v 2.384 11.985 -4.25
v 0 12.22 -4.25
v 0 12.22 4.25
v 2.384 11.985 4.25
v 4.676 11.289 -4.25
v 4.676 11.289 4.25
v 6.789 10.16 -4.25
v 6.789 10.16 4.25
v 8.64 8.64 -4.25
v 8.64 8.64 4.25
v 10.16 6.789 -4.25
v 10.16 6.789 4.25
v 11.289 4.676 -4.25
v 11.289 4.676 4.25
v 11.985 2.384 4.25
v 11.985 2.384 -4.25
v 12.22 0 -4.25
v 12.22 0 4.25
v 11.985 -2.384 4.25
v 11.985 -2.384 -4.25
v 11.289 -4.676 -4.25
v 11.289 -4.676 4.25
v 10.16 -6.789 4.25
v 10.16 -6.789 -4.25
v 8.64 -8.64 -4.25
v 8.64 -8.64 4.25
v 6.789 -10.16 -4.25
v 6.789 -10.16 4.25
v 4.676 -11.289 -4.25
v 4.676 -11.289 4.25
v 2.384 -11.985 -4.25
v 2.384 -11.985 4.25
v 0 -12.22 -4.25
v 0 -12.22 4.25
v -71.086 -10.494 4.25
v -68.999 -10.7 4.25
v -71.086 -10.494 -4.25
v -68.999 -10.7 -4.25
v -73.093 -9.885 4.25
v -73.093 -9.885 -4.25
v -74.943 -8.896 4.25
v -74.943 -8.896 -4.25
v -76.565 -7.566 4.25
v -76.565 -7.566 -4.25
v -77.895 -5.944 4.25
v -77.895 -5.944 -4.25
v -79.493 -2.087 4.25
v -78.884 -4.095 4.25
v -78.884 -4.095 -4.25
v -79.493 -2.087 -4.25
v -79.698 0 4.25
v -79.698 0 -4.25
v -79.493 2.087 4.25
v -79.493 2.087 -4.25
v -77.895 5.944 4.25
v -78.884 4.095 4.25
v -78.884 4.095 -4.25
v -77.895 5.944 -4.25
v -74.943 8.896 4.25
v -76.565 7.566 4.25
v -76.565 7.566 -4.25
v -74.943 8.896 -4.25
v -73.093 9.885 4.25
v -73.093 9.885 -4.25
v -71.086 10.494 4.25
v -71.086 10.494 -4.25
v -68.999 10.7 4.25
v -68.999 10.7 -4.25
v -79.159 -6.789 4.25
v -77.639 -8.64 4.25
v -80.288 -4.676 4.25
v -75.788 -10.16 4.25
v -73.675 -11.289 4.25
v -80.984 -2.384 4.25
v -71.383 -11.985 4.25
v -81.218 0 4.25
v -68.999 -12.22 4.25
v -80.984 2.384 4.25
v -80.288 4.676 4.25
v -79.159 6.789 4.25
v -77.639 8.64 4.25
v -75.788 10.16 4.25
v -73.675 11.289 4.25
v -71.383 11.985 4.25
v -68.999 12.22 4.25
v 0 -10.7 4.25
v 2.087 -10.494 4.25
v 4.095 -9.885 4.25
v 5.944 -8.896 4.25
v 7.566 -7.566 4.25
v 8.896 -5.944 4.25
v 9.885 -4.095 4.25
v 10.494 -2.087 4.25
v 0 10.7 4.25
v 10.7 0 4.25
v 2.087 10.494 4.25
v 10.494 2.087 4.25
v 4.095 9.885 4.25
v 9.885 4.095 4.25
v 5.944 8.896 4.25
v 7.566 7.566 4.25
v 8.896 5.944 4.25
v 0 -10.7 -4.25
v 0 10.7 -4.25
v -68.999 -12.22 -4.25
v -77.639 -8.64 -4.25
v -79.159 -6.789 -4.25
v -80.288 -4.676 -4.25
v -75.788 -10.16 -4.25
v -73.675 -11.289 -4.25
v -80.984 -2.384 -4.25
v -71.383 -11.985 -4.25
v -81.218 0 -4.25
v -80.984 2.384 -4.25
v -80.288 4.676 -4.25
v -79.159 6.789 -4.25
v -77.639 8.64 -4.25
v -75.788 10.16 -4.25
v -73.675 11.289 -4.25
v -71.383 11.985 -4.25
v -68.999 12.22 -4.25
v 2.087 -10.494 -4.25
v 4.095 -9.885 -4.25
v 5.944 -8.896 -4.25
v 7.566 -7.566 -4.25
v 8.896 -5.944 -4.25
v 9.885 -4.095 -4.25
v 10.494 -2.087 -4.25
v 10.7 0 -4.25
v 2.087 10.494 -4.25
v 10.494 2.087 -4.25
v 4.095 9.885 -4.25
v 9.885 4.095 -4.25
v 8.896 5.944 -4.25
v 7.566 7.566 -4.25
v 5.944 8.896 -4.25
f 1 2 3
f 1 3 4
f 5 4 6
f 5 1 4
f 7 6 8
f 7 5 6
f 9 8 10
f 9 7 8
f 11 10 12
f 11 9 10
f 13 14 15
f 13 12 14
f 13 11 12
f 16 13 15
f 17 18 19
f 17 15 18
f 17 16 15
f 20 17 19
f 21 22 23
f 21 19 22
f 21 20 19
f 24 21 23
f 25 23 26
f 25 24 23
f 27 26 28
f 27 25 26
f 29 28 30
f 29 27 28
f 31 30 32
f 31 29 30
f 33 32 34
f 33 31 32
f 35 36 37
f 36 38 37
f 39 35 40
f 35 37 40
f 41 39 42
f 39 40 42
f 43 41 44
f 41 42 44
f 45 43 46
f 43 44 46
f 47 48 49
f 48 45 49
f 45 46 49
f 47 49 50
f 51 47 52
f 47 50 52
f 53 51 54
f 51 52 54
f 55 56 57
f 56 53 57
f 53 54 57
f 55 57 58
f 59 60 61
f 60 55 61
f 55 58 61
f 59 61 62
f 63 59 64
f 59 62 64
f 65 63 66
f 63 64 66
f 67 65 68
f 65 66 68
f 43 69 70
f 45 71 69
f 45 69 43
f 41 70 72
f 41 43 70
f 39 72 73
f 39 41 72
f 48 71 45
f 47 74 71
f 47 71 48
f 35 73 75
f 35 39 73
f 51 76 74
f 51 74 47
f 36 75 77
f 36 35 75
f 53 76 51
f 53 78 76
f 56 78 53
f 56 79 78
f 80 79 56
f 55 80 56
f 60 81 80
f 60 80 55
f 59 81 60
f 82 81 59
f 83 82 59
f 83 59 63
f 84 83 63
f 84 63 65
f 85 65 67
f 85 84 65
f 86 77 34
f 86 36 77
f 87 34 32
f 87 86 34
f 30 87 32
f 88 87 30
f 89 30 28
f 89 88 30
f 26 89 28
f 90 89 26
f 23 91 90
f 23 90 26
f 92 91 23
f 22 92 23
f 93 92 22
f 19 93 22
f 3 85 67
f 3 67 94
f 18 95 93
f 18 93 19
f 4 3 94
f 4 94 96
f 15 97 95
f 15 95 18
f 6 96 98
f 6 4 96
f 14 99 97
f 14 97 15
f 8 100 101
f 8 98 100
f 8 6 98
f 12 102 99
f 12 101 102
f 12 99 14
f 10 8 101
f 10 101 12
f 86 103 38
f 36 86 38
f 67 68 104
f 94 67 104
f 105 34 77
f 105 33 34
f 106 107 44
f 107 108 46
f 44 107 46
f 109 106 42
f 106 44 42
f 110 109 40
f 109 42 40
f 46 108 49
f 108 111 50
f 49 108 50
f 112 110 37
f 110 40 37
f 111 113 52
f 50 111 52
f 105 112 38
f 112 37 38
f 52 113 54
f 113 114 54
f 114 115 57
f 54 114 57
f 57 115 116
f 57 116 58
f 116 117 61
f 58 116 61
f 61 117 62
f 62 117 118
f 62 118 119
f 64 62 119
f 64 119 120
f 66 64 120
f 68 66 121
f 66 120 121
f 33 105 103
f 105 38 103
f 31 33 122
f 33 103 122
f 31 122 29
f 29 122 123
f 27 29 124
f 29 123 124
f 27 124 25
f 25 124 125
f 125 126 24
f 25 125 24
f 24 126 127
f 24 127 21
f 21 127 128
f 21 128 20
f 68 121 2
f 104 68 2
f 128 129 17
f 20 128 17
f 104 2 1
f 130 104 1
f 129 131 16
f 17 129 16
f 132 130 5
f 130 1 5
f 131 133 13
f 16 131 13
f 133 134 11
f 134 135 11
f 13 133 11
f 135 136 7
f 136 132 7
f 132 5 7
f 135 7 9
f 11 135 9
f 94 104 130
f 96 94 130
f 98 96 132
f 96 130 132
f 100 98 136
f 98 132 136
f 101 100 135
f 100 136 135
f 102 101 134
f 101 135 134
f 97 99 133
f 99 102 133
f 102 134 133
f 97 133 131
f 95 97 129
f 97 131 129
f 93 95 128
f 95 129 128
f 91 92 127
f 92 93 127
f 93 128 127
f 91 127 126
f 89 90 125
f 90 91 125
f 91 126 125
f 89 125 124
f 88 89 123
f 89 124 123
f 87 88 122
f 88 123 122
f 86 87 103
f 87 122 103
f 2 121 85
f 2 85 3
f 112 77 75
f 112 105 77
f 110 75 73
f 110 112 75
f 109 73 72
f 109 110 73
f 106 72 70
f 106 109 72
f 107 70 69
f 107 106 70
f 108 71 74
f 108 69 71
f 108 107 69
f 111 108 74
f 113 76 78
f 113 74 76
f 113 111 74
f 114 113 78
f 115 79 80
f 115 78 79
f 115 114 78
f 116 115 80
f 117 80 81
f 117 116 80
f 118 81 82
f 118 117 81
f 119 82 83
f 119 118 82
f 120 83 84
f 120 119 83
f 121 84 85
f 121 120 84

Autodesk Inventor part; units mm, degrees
ref_plane "YZ Plane" through (0, 0, 0) normal (1, 0, 0) x (0, 1, 0)
ref_plane "XZ Plane" through (0, 0, 0) normal (0, 1, 0) x (-1, 0, 0)
ref_plane "XY Plane" through (0, 0, 0) normal (0, 0, 1) x (1, 0, 0)
sketch "Sketch1" plane through (0, 0, 0) normal (0, 0, 1) x (1, 0, 0)
  arc A0 (0, -11.4595) -> (0, 11.4595) centre (0, 0) ccw construction
  arc A1 (-68.9989, 11.4595) -> (-68.9989, -11.4595) centre (-68.9989, 0) ccw construction
  line L0 (0, -11.4595) -> (-68.9989, -11.4595) construction
  line L1 (0, 11.4595) -> (-68.9989, 11.4595) construction
  dimension "Belt_Teeth" = 70
  dimension "Belt_Pitch2" = 3
  dimension "d0" = 22.919
  dimension "d1" = 22.919
  dimension "d2" = 36.0011
  dimension "d3" = 36.0011
  dimension "Center_Distance" = 68.9989
  dimension "d5" = 68.9989
sketch "Sketch2" plane through (0, 0, 0) normal (0, 0, 1) x (1, 0, 0)
  line L0 (35.7235, 34.2567) -> (38.7235, 34.2567)
  point P0 (0, 0)
  dimension "Belt_Pitch2" = 3
sketch "Sketch4" plane through (0, 0, 0) normal (0, 0, 1) x (1, 0, 0)
  line L0 (-16.1422, -21.869) -> (-14.1422, -21.869)
  line L1 (-16.1422, -21.869) -> (-16.1422, -20.349)
  arc A0 (-15.5872, -20.904) -> (-16.1422, -20.349) centre (-16.1422, -20.904) ccw
  line L2 (-15.5872, -20.904) -> (-15.5872, -20.959)
  arc A1 (-15.5872, -20.959) -> (-15.4372, -21.109) centre (-15.4372, -20.959) ccw
  line L3 (-15.4372, -21.109) -> (-14.8472, -21.109)
  line L4 (-14.1422, -21.869) -> (-14.1422, -20.349)
  arc A2 (-14.1422, -20.349) -> (-14.6972, -20.904) centre (-14.1422, -20.904) ccw
  arc A3 (-14.8472, -21.109) -> (-14.6972, -20.959) centre (-14.8472, -20.959) ccw
  line L5 (-14.6972, -20.959) -> (-14.6972, -20.904)
  line L6 (0, 11.4595) -> (-68.9989, 11.4595) construction
  arc A4 (-68.9989, 11.4595) -> (-68.9989, -11.4595) centre (-68.9989, 0) ccw construction
  line L7 (0, -11.4595) -> (-68.9989, -11.4595) construction
  arc A5 (0, -11.4595) -> (0, 11.4595) centre (0, 0) ccw construction
  arc A6 (-68.9989, 12.2195) -> (-68.9989, -12.2195) centre (-68.9989, 0) ccw
  line L8 (-68.9989, 12.2195) -> (0, 12.2195)
  arc A7 (0, -12.2195) -> (0, 12.2195) centre (0, 0) ccw
  line L9 (0, -12.2195) -> (-68.9989, -12.2195)
  arc A8 (-68.9989, 10.6995) -> (-68.9989, -10.6995) centre (-68.9989, 0) ccw
  line L10 (-68.9989, 10.6995) -> (0, 10.6995)
  arc A9 (0, -10.6995) -> (0, 10.6995) centre (0, 0) ccw
  line L11 (0, -10.6995) -> (-68.9989, -10.6995)
  point P0 (-15.1422, -21.109)
  point P1 (-15.1422, -21.869)
  dimension "d9" = 2
  dimension "d10" = 1.52
  dimension "d11" = 0.76
  dimension "d12" = 0.555
  dimension "d13" = 0.555
  dimension "d14" = 0.15
  dimension "d15" = 0.15
  dimension "belt_thickness" = 1.52
  dimension "d44" = 0.76
extrude "Extrusion2" add sketch "Sketch4" along normal mid plane 8.5 contours L8 A7 L9 A6
sketch "Sketch5" plane through (0, 0, 4.25) normal (0, 0, 1) x (1, 0, 0)
  line L0 (-68.9989, 10.6995) -> (0, 10.6995) construction
  arc A0 (0, -10.6995) -> (0, 10.6995) centre (0, 0) ccw construction
  line L1 (0, -10.6995) -> (-68.9989, -10.6995) construction
  arc A1 (-68.9989, 10.6995) -> (-68.9989, -10.6995) centre (-68.9989, 0) ccw construction
  arc A2 (-68.9989, 12.2195) -> (-68.9989, -12.2195) centre (-68.9989, 0) ccw construction
  line L2 (-68.9989, -12.2195) -> (0, -12.2195) construction
  arc A3 (0, -12.2195) -> (0, 12.2195) centre (0, 0) ccw construction
  line L3 (0, 12.2195) -> (-68.9989, 12.2195) construction
  line L4 (-7.7556, -2.6989) -> (-5.7556, -2.6989)
  line L5 (-7.7556, -2.6989) -> (-7.7556, -1.1789) construction
  arc A4 (-7.2006, -1.7339) -> (-7.7556, -1.1789) centre (-7.7556, -1.7339) ccw
  line L6 (-7.2006, -1.7339) -> (-7.2006, -1.7889)
  arc A5 (-7.2006, -1.7889) -> (-7.0506, -1.9389) centre (-7.0506, -1.7889) ccw
  line L7 (-7.0506, -1.9389) -> (-6.4606, -1.9389)
  line L8 (-5.7556, -2.6989) -> (-5.7556, -1.1789)
  arc A6 (-5.7556, -1.1789) -> (-6.3106, -1.7339) centre (-5.7556, -1.7339) ccw
  arc A7 (-6.4606, -1.9389) -> (-6.3106, -1.7889) centre (-6.4606, -1.7889) ccw
  line L9 (-6.3106, -1.7889) -> (-6.3106, -1.7339)
  line L10 (-8.3106, -1.7339) -> (-8.3106, -1.7889)
  arc A8 (-7.7556, -1.1789) -> (-8.3106, -1.7339) centre (-7.7556, -1.7339) ccw
  arc A9 (-8.4606, -1.9389) -> (-8.3106, -1.7889) centre (-8.4606, -1.7889) ccw
  line L11 (-8.4606, -1.9389) -> (-9.0506, -1.9389)
  line L12 (-7.7556, -2.6989) -> (-9.7556, -2.6989)
  line L13 (-9.2006, -1.7889) -> (-9.2006, -1.7339)
  arc A10 (-9.2006, -1.7339) -> (-9.7556, -1.1789) centre (-9.7556, -1.7339) ccw
  line L14 (-9.7556, -2.6989) -> (-9.7556, -1.1789)
  arc A11 (-9.2006, -1.7889) -> (-9.0506, -1.9389) centre (-9.0506, -1.7889) ccw
  line L15 (-17.66, -0.8495) -> (-14.922, -0.8495) construction
  line L16 (-14.922, -0.8495) -> (-14.922, -2.3671) construction
  line L17 (-14.922, -2.3671) -> (-17.66, -2.3671) construction
  line L18 (-17.66, -2.3671) -> (-17.66, -0.8495) construction
  arc A12 (-15.6383, -1.7102) -> (-16.7483, -1.7102) centre (-16.1933, -1.7102) ccw construction
  line L19 (-16.7483, -1.7102) -> (-16.7483, -1.7652) construction
  arc A13 (-16.8983, -1.9152) -> (-16.7483, -1.7652) centre (-16.8983, -1.7652) ccw construction
  line L20 (-16.7483, -1.7102) -> (-16.7483, -1.9152) construction
  line L21 (-15.6383, -1.7102) -> (-15.6383, -1.9152) construction
  point P0 (-6.7556, -1.9389)
  point P1 (-6.7556, -2.6989)
  point P2 (-8.7556, -2.6989)
  point P3 (-8.7556, -1.9389)
  dimension "d22" = 2
  dimension "d23" = 1.52
  dimension "d24" = 0.76
  dimension "d25" = 0.555
  dimension "d26" = 0.555
  dimension "d27" = 0.15
  dimension "d28" = 0.15
  dimension "d29" = 0.76
  dimension "d30" = 1
  dimension "d31" = 2
  dimension "d32" = 0.59
  dimension "d34" = 0.555
  dimension "d35" = 0
  dimension "d36" = 0
  dimension "d37" = 0.15
  dimension "d38" = 0.055
  dimension "d39" = 0.055
  dimension "d40" = 0
  dimension "d41" = 0
  dimension "d42" = 0.205
  dimension "d43" = 0.205
equation "\"Belt_Teeth\" = 70"
equation "\"d13\" = d12"
equation "\"d15\" = d14"
equation "\"d44\" = 0.5 * belt_thickness"
equation "\"d26\" = d25"
equation "\"d28\" = d27"
equation "\"d30\" = 0.5 * d22"
equation "\"d31\" = d22"
equation "\"d43\" = d42"
equation "\"Belt_Pitch\" = 3"
equation "\"HTD_5mm\" = 5"
equation "\"GT2_3mm\" = 3"
equation "\"Center_Distance_Copy\" = Center_Distance"
properties part number "BELT" material "Rubber"
